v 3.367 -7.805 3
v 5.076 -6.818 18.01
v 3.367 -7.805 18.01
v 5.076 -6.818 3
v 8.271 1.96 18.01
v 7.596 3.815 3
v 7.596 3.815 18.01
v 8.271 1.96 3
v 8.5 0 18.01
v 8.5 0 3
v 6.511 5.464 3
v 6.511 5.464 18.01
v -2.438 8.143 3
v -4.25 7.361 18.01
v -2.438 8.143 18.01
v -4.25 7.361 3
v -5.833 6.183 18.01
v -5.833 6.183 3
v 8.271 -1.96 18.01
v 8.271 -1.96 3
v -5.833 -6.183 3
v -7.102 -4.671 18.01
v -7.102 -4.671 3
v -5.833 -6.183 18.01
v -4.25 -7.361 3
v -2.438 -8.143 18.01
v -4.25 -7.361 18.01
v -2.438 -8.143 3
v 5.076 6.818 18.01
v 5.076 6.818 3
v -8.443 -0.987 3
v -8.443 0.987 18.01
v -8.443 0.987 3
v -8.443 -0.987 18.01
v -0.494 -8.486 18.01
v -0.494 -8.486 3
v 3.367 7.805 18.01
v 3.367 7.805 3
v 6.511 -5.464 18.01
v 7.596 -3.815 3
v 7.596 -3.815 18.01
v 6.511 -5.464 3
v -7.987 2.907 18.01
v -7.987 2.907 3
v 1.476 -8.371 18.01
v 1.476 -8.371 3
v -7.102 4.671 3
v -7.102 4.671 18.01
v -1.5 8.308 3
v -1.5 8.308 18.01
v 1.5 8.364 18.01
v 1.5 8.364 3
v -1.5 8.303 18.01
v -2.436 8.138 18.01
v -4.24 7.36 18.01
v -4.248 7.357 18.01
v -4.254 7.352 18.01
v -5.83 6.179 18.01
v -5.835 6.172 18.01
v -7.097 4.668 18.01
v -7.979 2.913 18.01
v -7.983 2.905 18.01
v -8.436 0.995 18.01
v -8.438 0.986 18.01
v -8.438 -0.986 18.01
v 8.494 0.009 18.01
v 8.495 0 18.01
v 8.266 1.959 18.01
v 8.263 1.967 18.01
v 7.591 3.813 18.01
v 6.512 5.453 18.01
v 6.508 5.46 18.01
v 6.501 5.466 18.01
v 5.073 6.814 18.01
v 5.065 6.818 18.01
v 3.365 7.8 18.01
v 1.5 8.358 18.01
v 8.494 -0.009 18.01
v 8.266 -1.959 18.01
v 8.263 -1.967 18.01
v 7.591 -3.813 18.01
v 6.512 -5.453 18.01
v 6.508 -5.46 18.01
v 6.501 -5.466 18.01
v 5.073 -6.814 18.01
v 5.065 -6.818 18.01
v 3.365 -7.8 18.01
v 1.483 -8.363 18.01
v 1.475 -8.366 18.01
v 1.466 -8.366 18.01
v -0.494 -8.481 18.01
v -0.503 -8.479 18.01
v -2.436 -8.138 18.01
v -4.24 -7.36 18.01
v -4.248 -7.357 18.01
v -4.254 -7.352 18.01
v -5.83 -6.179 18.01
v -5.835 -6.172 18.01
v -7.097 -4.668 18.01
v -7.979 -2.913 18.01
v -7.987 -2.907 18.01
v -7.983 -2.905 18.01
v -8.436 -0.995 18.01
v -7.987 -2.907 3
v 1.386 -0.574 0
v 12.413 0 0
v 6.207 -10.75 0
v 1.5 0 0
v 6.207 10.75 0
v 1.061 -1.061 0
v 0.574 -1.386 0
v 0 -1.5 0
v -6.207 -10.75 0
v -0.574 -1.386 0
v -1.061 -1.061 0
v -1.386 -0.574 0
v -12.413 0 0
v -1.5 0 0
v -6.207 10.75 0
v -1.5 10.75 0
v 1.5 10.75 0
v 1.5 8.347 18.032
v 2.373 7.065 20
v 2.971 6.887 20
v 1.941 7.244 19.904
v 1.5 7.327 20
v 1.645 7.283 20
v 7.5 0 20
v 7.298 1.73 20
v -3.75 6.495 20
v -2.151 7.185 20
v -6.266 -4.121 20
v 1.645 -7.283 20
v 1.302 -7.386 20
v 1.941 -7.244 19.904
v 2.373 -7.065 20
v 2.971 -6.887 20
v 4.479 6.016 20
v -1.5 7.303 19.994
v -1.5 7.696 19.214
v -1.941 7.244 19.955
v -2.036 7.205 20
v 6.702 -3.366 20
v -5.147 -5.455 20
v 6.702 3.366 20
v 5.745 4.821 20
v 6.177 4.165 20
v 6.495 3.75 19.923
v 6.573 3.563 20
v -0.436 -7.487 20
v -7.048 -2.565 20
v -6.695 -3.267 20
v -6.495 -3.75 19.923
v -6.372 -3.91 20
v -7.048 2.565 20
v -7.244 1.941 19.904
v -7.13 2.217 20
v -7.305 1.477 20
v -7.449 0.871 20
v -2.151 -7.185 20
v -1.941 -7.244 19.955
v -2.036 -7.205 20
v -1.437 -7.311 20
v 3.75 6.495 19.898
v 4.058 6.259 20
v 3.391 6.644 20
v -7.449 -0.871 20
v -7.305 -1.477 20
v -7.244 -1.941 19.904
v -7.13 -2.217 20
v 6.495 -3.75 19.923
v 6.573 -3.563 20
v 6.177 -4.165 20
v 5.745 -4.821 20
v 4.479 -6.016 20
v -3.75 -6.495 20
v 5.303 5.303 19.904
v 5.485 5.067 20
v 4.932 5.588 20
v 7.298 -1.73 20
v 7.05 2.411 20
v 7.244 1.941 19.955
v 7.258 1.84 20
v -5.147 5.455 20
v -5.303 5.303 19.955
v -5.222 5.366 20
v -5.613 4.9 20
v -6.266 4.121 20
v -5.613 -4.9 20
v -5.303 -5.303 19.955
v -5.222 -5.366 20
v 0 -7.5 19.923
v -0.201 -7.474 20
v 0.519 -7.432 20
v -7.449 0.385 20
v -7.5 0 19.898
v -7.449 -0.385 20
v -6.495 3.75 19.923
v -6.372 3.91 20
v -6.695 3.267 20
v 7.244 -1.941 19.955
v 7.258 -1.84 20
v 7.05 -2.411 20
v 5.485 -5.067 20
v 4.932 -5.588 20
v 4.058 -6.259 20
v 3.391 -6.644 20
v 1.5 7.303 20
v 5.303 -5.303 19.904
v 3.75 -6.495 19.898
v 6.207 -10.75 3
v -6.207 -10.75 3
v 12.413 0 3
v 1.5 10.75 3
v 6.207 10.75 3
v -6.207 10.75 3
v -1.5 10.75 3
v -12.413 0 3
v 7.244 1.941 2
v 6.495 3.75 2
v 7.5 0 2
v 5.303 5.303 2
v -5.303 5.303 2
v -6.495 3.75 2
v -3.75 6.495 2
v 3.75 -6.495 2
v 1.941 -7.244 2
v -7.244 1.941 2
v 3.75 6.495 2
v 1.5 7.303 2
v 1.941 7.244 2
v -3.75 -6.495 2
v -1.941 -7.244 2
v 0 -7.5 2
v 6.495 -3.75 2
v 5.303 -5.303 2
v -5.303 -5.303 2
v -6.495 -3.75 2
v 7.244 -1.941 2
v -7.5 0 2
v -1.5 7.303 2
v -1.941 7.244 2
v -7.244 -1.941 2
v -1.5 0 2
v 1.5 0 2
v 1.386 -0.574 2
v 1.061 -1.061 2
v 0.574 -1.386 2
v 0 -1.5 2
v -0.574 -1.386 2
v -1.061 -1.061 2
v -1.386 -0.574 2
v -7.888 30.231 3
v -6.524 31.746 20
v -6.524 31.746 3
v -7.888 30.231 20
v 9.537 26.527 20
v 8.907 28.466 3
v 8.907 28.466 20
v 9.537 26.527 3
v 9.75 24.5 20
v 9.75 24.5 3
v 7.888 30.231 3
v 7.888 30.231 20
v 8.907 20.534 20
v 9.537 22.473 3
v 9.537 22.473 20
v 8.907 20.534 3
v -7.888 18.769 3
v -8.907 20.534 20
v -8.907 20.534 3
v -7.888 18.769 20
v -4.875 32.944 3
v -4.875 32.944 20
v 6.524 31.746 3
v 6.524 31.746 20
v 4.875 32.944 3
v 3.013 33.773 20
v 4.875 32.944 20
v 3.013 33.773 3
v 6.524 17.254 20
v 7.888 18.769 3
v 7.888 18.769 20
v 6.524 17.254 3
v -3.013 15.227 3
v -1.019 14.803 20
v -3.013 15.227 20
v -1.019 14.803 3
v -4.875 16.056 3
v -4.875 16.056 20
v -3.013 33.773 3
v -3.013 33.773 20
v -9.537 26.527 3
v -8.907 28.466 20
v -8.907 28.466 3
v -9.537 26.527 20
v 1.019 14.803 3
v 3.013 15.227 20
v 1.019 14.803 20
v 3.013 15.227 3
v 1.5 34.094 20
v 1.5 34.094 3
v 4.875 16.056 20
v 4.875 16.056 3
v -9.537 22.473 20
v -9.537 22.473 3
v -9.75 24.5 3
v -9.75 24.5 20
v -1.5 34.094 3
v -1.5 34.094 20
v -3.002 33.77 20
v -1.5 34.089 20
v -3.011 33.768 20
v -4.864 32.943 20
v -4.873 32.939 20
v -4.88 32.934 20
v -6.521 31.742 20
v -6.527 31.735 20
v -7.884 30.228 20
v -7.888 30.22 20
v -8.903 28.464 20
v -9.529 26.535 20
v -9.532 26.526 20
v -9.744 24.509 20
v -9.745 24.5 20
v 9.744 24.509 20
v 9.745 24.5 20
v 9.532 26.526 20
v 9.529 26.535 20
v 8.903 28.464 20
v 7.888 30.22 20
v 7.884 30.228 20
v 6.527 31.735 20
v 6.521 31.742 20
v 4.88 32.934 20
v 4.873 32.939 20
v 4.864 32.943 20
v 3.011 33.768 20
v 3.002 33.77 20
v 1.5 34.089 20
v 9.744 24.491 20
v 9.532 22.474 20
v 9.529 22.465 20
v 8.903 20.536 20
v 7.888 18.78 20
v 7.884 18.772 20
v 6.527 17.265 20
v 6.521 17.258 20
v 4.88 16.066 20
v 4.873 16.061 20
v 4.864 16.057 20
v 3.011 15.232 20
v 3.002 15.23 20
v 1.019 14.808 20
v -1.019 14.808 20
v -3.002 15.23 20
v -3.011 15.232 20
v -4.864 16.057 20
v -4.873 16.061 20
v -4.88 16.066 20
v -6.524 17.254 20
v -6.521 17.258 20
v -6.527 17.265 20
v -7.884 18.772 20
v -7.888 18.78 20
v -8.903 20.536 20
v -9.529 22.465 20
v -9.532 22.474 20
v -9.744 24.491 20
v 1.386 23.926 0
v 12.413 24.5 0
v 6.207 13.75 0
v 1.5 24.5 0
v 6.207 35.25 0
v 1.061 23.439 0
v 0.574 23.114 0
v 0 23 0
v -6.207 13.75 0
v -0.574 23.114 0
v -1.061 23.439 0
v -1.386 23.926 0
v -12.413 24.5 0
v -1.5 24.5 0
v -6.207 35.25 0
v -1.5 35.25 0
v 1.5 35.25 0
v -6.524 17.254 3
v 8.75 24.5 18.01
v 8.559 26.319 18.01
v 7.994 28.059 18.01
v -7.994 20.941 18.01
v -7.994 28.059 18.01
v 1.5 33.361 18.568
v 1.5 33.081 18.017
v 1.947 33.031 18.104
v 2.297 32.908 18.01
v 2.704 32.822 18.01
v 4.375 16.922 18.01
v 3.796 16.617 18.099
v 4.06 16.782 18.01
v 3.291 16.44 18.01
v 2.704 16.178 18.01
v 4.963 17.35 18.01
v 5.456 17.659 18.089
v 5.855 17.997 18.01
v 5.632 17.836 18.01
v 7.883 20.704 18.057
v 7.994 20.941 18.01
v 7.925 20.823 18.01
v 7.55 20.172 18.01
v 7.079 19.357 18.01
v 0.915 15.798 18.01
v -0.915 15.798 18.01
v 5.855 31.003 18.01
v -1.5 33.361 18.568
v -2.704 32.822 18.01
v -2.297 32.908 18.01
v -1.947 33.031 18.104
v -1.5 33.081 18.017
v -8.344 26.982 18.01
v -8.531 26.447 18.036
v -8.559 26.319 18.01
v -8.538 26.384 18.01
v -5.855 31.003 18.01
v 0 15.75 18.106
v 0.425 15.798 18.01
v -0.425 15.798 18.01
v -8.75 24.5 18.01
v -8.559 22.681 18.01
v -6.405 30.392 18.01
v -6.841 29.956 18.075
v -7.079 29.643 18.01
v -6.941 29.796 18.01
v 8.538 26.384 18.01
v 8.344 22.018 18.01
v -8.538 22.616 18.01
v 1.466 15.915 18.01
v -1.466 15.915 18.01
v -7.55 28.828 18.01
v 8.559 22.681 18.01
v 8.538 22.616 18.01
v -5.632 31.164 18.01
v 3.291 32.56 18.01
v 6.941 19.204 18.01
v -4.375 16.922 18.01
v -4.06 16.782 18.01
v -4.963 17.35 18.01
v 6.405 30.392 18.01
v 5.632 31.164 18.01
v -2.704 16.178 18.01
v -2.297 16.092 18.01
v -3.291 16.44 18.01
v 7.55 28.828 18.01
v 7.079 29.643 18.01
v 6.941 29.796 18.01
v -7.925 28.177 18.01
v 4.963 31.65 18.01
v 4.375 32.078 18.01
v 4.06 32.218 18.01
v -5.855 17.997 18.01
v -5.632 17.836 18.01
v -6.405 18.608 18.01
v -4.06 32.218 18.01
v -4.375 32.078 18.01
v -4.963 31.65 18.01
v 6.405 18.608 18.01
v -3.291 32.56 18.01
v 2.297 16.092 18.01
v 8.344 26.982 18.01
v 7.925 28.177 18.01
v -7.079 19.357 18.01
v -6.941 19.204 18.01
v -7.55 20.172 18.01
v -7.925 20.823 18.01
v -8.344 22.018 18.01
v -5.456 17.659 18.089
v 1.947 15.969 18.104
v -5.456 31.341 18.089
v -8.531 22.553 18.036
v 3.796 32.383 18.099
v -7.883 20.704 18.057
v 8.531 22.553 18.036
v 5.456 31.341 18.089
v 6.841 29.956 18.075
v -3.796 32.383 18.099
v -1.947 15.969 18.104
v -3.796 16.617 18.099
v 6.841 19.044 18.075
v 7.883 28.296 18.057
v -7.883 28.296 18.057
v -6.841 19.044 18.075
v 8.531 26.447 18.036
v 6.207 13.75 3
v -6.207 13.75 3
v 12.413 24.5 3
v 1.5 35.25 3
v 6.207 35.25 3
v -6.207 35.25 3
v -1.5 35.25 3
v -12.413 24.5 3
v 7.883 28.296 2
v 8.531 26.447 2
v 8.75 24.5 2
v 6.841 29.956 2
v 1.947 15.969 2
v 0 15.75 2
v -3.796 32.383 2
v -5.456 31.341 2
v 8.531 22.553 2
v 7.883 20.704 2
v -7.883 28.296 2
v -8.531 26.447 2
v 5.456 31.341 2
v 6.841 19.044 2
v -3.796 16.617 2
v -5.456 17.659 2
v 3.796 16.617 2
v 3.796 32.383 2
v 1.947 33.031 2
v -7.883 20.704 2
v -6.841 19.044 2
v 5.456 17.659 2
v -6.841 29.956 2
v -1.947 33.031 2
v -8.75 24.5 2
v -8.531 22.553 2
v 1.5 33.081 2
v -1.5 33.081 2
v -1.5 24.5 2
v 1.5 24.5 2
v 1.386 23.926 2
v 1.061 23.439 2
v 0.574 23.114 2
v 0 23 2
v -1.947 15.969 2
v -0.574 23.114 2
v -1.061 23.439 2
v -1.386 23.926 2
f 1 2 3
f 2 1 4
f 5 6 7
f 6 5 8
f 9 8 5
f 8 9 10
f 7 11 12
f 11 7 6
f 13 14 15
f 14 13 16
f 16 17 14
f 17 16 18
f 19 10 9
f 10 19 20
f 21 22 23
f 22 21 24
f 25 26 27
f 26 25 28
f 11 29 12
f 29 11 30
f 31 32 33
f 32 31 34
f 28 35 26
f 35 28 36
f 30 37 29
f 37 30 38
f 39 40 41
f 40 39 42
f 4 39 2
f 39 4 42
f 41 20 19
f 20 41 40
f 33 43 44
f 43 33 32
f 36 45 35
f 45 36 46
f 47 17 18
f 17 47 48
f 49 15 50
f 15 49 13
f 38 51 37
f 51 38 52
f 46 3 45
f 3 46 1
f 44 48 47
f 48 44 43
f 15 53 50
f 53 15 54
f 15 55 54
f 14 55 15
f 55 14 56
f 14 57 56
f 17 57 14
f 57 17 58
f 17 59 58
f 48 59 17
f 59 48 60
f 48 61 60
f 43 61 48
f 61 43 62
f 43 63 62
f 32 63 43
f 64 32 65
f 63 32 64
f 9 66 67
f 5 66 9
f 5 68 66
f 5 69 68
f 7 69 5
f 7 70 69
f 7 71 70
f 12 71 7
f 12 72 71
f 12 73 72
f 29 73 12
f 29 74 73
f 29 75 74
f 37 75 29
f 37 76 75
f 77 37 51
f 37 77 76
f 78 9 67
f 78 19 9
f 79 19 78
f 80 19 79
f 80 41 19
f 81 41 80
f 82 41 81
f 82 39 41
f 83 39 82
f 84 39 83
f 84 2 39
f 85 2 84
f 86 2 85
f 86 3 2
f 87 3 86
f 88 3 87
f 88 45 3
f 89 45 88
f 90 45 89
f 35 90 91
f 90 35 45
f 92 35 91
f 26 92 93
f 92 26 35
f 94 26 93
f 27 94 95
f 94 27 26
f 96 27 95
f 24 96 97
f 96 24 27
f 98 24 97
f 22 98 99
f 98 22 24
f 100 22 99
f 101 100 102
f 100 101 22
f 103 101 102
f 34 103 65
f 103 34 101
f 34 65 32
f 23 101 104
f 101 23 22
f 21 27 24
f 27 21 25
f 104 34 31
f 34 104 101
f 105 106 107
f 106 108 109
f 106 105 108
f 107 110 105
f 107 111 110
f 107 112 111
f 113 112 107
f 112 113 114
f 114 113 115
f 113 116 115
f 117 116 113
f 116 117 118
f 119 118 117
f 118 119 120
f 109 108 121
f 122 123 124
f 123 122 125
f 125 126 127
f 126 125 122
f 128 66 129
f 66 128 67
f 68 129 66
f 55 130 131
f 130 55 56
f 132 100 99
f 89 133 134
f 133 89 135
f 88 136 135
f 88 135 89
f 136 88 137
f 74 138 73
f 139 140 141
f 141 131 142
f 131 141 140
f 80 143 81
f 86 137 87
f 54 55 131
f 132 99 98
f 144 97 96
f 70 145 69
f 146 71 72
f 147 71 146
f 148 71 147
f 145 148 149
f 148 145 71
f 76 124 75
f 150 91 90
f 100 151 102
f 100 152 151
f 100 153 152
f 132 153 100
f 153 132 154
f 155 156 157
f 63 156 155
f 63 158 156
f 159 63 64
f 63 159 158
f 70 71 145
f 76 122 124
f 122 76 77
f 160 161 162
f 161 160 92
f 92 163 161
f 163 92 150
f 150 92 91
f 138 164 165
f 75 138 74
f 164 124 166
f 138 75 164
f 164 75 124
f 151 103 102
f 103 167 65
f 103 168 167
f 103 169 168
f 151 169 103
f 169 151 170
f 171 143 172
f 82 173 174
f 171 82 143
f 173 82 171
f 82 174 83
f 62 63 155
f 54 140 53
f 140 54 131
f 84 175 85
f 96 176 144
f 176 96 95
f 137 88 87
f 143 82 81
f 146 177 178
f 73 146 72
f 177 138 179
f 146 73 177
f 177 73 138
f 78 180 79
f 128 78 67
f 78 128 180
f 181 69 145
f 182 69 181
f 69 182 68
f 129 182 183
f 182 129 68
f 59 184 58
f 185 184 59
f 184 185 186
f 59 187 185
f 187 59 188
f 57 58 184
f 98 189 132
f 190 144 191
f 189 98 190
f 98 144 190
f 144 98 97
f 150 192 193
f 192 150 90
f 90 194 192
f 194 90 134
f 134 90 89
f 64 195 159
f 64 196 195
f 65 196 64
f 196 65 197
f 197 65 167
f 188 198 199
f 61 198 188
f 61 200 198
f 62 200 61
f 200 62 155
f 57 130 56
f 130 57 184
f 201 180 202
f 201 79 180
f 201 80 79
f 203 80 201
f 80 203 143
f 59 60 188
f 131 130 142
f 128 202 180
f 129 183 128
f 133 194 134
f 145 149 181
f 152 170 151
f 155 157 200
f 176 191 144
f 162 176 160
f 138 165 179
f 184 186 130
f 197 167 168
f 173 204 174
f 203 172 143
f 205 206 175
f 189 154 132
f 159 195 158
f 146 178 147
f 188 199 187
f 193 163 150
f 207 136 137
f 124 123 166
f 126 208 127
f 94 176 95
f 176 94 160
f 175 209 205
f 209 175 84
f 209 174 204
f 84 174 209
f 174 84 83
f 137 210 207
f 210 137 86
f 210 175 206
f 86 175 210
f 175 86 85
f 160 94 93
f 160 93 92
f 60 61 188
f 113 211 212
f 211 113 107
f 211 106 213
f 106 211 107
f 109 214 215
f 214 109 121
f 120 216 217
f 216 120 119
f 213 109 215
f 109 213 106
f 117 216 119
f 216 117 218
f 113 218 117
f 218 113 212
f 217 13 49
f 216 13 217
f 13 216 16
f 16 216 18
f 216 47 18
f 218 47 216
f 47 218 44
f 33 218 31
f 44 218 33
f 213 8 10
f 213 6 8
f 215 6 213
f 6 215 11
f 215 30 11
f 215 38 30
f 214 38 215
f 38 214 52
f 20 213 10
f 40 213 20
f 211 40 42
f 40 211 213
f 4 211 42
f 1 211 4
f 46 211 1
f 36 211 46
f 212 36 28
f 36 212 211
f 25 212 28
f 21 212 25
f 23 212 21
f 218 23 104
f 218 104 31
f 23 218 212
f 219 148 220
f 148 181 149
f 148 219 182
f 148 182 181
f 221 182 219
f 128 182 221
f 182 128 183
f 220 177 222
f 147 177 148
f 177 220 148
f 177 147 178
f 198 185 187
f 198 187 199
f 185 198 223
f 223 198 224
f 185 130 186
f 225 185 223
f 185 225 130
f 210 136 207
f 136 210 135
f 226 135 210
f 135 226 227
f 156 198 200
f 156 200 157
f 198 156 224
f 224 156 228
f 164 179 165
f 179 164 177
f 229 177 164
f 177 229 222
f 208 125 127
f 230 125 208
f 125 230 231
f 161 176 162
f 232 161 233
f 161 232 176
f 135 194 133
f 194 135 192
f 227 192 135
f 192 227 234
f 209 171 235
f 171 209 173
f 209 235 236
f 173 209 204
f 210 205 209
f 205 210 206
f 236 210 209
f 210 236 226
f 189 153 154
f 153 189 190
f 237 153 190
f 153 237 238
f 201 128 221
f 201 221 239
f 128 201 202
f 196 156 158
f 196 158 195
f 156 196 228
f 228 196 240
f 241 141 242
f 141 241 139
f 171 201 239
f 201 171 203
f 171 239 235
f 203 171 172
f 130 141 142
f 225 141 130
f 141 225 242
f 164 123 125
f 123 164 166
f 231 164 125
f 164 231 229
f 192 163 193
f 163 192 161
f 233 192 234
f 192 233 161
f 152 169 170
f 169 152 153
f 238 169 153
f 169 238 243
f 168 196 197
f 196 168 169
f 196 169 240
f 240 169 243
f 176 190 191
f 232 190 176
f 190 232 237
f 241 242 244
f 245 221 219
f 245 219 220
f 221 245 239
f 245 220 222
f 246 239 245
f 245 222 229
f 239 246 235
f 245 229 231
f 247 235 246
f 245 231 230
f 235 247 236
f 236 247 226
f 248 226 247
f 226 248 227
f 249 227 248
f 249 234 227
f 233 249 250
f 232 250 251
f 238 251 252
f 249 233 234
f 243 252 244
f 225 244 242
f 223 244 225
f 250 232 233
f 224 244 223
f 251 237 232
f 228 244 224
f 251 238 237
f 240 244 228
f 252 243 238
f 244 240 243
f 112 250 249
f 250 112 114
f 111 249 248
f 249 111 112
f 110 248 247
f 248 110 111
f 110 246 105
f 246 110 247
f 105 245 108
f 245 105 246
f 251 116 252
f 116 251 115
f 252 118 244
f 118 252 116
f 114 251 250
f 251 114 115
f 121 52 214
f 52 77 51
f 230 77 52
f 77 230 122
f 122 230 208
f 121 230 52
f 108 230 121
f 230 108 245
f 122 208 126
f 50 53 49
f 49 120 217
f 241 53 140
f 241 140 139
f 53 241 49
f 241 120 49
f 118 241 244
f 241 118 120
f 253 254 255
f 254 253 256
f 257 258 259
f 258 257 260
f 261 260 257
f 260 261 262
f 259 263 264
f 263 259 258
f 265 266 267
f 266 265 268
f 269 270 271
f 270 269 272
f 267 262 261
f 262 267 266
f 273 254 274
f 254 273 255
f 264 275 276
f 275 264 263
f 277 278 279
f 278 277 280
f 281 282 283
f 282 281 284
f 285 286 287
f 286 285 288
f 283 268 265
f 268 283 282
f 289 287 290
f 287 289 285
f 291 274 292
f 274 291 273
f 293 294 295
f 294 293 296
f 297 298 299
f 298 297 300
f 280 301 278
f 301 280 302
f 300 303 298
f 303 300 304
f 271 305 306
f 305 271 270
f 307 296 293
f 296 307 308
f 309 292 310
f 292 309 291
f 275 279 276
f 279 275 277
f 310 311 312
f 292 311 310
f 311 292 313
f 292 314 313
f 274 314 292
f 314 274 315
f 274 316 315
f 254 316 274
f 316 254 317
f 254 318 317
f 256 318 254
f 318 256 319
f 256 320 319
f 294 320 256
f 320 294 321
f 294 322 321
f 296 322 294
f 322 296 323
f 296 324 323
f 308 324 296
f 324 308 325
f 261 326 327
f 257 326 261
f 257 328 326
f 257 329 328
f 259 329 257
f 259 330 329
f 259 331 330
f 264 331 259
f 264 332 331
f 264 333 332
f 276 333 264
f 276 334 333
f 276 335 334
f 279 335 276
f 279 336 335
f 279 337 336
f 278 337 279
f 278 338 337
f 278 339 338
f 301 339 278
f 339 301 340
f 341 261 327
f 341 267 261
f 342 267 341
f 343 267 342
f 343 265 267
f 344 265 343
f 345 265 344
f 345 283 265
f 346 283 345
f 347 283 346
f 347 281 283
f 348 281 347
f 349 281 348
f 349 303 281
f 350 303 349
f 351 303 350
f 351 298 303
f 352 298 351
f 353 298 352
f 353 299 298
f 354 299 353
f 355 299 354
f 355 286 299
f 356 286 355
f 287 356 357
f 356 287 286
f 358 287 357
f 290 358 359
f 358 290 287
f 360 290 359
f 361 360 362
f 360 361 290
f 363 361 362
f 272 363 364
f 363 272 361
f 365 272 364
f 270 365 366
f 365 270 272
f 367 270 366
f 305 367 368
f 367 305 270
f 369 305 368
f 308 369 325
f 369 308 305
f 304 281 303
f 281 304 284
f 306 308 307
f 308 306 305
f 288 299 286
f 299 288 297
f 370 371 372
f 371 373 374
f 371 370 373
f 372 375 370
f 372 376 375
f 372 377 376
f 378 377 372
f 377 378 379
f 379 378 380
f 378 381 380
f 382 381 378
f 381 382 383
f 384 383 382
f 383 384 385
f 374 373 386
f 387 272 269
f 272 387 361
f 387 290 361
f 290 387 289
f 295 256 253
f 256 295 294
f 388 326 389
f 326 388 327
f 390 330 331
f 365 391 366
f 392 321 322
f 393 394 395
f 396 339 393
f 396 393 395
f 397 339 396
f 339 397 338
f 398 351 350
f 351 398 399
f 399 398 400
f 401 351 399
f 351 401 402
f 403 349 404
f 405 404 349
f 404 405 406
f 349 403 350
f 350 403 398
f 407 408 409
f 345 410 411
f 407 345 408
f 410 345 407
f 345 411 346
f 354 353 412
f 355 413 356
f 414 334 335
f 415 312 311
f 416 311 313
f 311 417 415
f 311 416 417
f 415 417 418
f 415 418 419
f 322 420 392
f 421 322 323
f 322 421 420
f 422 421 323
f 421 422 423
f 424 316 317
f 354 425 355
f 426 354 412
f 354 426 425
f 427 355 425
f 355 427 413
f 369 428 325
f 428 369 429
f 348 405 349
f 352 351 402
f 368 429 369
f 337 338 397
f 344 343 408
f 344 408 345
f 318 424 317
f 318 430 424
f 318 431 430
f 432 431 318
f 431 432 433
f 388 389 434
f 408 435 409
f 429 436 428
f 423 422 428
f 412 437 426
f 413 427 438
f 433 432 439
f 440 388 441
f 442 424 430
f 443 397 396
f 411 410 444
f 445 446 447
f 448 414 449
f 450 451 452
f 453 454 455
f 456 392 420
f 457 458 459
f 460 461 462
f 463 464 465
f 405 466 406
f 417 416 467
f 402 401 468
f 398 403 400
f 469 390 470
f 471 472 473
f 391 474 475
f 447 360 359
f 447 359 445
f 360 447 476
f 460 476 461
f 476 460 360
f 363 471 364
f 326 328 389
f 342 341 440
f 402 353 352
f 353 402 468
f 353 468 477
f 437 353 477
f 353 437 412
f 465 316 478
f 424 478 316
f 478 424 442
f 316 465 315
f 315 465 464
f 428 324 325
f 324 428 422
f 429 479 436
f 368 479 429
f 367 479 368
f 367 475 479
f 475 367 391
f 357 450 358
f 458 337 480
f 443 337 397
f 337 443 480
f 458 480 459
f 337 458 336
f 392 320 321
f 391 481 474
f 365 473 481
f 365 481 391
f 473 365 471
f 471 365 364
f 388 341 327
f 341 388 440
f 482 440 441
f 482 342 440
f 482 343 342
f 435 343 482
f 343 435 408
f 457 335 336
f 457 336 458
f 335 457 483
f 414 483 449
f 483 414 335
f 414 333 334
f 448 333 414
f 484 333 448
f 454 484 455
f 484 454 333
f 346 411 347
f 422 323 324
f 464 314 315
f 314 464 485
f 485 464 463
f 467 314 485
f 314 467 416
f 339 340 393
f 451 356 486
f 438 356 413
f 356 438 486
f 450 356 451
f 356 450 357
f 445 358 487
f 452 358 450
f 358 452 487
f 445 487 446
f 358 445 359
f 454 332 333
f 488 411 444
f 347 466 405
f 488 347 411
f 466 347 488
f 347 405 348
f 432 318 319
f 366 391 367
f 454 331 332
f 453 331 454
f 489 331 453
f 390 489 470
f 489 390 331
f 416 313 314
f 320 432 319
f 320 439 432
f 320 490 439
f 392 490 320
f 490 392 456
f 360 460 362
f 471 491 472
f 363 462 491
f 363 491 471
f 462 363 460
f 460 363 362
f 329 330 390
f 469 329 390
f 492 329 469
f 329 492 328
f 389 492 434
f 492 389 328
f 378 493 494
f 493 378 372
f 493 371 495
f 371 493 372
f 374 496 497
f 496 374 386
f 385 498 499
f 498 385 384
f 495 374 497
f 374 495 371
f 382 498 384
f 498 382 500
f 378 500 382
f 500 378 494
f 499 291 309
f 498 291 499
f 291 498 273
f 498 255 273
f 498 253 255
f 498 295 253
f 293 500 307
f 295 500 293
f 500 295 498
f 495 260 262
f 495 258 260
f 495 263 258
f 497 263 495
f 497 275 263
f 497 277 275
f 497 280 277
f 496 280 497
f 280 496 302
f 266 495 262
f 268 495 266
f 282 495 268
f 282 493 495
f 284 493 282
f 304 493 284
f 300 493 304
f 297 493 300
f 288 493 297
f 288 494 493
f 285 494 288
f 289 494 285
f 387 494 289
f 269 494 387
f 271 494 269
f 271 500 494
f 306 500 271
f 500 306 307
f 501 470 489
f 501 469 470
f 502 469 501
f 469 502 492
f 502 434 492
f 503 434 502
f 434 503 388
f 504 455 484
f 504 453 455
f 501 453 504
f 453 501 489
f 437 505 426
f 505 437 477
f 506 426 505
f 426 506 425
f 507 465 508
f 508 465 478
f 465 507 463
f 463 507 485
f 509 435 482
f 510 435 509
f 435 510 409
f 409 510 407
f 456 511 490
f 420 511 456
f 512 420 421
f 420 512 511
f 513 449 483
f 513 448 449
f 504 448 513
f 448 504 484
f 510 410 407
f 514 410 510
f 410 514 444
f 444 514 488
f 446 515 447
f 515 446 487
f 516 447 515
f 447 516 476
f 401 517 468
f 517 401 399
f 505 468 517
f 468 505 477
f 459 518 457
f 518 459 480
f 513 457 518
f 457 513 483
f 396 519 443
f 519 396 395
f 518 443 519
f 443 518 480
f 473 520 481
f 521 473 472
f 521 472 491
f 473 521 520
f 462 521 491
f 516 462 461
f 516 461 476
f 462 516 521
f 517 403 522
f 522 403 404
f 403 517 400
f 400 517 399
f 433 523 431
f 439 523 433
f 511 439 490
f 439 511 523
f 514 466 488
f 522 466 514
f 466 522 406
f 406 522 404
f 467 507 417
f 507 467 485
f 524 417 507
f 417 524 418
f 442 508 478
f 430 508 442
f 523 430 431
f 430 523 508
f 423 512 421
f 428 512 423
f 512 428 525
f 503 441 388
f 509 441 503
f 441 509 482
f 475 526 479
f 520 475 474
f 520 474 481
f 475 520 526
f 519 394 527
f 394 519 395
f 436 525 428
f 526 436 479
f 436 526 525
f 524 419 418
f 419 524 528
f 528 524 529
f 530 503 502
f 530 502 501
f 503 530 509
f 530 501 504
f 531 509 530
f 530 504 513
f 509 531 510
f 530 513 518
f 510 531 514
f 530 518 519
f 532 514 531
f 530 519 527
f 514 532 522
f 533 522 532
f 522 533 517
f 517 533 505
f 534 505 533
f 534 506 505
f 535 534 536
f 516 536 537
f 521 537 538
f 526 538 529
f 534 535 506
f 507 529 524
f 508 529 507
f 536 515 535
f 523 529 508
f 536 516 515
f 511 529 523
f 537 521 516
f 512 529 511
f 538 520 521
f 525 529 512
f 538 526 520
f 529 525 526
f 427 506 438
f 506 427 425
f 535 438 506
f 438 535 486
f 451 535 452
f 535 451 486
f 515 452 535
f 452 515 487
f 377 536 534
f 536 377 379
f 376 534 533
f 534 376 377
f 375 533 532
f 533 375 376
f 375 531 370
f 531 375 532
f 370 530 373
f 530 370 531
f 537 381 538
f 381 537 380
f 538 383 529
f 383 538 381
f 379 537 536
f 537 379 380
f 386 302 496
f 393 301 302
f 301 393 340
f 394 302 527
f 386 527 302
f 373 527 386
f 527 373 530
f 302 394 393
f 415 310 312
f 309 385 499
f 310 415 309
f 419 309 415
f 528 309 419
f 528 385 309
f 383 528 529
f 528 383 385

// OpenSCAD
wallThickness = 1;
length = 20;
innerDiameterOfInnerCylinder = 15;
tolerance = 0.25;
hexStickout = 1;
hexHeight = 3;
hole = 3;
baseThickness = 2;
slit = 1; //[1:yes, 0:no]

module dummy() {}

nudge = 0.01;
id1 = innerDiameterOfInnerCylinder;
od1 = innerDiameterOfInnerCylinder+2*wallThickness;
id2 = od1+2*tolerance;
od2 = id2+2*wallThickness;
hexID = od2+hexStickout*2;
hexOD = hexID / cos(180/6);

module taperedCylinder(d=10,h=10,taper=2,taperRatio=2) {
    if (taper>0) {
        cylinder(d=d,h=h-taper*taperRatio+nudge);
        translate([0,0,h-taper*taperRatio]) cylinder(d1=d,d2=d-2*taper,h=taper*taperRatio);
    }
    else {
        difference(){
            cylinder(d=d,h=h);
            translate([0,0,h+taper*taperRatio+nudge]) cylinder(d1=d+2*taper,d2=d,h=-taper*taperRatio);
        }
    }
}

module hexRing() {
    cylinder(d=hexOD,h=hexHeight,$fn=6);
}

module inner() {
    render(convexity=1)
    difference() {
        union() {
            taperedCylinder(d=od1,h=length,taper=wallThickness);
            hexRing();
        }
        translate([0,0,baseThickness]) cylinder(d=id1,h=length);
        translate([0,0,-nudge])
        cylinder(d=hole,h=baseThickness+2*nudge,$fn=16);
        if (slit)
        translate([-hole/2,0,-nudge]) 
        cube([hole,od2*2,baseThickness+length+2*nudge]);
    }
}

module outer() {
    render(convexity=1)
    difference() {
        union() {
            taperedCylinder(d=od2,h=length,taper=-wallThickness);
            hexRing();
        }
        translate([0,0,baseThickness]) cylinder(d=id2,h=length);
        translate([0,0,-nudge]) 
        cylinder(d=hole,h=baseThickness+2*nudge,$fn=16);
        if (slit)
        translate([-hole/2,0,-nudge]) 
        cube([hole,od2*2,baseThickness+length+2*nudge]);
    }
}

inner();
translate([0,od2+5,0]) outer();
